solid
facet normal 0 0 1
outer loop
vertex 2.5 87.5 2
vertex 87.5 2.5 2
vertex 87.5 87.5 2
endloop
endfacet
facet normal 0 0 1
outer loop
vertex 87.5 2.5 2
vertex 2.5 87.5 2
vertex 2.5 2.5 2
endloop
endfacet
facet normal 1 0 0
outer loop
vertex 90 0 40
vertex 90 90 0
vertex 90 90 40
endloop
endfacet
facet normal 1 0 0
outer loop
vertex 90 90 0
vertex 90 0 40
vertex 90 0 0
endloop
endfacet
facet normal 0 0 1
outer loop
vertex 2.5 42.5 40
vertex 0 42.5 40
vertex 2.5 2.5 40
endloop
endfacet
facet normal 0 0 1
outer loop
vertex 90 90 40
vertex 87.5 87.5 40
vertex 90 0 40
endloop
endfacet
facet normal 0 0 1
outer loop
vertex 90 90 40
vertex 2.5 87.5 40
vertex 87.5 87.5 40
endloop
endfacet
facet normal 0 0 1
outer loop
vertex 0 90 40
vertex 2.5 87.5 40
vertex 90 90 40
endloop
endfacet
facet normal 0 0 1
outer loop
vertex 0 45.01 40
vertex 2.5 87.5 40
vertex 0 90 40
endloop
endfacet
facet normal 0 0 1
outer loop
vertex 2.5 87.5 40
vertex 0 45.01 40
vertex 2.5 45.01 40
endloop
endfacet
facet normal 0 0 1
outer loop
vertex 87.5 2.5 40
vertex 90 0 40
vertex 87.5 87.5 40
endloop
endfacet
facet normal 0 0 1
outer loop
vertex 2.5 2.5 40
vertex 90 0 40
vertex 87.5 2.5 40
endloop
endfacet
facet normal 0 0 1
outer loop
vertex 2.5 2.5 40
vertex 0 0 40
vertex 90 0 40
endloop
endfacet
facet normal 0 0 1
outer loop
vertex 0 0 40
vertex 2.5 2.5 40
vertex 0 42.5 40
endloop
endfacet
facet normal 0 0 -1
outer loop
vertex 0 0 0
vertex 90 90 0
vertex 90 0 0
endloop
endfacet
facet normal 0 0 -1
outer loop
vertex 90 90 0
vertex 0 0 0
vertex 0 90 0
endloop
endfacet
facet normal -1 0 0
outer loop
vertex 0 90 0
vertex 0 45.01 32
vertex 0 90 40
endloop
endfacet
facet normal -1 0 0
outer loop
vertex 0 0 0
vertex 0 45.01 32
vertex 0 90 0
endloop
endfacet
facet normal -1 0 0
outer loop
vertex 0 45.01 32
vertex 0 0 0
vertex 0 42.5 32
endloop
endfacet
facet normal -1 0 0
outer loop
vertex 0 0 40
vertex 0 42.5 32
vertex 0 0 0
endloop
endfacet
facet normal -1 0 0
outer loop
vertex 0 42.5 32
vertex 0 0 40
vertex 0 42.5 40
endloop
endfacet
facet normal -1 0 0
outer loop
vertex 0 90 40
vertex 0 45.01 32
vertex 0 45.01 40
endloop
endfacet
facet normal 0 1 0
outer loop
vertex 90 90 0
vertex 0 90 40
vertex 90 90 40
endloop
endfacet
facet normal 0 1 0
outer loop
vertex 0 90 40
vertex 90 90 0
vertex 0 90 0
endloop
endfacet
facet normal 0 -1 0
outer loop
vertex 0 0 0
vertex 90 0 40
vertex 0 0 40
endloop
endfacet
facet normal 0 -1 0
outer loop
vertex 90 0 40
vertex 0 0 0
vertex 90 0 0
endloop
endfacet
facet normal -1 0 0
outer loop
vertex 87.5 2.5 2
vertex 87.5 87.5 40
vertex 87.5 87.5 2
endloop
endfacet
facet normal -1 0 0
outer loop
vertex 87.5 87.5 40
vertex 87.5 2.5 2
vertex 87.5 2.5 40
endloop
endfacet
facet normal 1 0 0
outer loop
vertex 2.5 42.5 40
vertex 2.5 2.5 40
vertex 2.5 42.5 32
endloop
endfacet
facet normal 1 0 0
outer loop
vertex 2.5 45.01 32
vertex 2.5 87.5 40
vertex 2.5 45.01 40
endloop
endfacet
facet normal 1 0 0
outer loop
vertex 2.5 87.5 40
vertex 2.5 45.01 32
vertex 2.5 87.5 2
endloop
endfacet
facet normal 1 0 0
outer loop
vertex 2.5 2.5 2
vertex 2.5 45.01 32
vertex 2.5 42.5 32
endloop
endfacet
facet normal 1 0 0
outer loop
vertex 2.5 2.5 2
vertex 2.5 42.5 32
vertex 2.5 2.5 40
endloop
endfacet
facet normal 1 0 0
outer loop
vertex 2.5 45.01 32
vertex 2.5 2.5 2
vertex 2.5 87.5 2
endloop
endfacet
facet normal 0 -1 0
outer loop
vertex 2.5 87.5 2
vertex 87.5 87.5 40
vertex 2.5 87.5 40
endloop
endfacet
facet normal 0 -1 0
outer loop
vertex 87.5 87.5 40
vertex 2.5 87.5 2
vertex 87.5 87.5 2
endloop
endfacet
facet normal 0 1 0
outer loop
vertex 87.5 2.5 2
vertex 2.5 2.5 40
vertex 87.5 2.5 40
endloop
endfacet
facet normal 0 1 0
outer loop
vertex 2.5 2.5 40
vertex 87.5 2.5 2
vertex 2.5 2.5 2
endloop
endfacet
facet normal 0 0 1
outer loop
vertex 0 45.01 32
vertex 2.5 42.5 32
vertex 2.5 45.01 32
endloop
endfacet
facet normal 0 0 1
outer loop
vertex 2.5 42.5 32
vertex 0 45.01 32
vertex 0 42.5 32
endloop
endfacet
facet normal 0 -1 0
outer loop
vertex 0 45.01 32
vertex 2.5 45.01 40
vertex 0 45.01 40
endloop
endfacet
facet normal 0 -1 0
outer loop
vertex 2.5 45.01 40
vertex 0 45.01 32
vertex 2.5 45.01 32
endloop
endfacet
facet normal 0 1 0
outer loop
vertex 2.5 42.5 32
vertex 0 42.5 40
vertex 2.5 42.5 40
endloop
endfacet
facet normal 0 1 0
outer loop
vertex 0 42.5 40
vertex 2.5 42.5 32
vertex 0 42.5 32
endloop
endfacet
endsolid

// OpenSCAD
$fn = 64;

// Dimensions
OUTER_X = 90;
OUTER_Y = 90;
TOP_Z = 2;
WALL_THICK = 2.5;
WALL_H = 40;
PITCH = 71.5;
HOLE_R = 2.25;
NOTCH_W = 12;
NOTCH_H = 8;
NOTCH_Z_START = 32;

difference() {
    // Outer solid box
    cube([OUTER_X, OUTER_Y, WALL_H]);
    
    // Inner hollow void
    translate([WALL_THICK, WALL_THICK, TOP_Z]) 
        cube([OUTER_X - 2*WALL_THICK, OUTER_Y - 2*WALL_THICK, WALL_H - TOP_Z + 0.01]);
        
    // Screw holes
    for (x = [-PITCH/2, PITCH/2]) {
        for (y = [-PITCH/2, PITCH/2]) {
            translate([x, y, 2]) cylinder(r=HOLE_R, h=2.01);
        }
    }
    
    // Cable notch
    translate([-NOTCH_W/2, 45 - WALL_THICK, NOTCH_Z_START]) 
        cube([NOTCH_W, WALL_THICK + 0.01, NOTCH_H + 0.01]);
}
